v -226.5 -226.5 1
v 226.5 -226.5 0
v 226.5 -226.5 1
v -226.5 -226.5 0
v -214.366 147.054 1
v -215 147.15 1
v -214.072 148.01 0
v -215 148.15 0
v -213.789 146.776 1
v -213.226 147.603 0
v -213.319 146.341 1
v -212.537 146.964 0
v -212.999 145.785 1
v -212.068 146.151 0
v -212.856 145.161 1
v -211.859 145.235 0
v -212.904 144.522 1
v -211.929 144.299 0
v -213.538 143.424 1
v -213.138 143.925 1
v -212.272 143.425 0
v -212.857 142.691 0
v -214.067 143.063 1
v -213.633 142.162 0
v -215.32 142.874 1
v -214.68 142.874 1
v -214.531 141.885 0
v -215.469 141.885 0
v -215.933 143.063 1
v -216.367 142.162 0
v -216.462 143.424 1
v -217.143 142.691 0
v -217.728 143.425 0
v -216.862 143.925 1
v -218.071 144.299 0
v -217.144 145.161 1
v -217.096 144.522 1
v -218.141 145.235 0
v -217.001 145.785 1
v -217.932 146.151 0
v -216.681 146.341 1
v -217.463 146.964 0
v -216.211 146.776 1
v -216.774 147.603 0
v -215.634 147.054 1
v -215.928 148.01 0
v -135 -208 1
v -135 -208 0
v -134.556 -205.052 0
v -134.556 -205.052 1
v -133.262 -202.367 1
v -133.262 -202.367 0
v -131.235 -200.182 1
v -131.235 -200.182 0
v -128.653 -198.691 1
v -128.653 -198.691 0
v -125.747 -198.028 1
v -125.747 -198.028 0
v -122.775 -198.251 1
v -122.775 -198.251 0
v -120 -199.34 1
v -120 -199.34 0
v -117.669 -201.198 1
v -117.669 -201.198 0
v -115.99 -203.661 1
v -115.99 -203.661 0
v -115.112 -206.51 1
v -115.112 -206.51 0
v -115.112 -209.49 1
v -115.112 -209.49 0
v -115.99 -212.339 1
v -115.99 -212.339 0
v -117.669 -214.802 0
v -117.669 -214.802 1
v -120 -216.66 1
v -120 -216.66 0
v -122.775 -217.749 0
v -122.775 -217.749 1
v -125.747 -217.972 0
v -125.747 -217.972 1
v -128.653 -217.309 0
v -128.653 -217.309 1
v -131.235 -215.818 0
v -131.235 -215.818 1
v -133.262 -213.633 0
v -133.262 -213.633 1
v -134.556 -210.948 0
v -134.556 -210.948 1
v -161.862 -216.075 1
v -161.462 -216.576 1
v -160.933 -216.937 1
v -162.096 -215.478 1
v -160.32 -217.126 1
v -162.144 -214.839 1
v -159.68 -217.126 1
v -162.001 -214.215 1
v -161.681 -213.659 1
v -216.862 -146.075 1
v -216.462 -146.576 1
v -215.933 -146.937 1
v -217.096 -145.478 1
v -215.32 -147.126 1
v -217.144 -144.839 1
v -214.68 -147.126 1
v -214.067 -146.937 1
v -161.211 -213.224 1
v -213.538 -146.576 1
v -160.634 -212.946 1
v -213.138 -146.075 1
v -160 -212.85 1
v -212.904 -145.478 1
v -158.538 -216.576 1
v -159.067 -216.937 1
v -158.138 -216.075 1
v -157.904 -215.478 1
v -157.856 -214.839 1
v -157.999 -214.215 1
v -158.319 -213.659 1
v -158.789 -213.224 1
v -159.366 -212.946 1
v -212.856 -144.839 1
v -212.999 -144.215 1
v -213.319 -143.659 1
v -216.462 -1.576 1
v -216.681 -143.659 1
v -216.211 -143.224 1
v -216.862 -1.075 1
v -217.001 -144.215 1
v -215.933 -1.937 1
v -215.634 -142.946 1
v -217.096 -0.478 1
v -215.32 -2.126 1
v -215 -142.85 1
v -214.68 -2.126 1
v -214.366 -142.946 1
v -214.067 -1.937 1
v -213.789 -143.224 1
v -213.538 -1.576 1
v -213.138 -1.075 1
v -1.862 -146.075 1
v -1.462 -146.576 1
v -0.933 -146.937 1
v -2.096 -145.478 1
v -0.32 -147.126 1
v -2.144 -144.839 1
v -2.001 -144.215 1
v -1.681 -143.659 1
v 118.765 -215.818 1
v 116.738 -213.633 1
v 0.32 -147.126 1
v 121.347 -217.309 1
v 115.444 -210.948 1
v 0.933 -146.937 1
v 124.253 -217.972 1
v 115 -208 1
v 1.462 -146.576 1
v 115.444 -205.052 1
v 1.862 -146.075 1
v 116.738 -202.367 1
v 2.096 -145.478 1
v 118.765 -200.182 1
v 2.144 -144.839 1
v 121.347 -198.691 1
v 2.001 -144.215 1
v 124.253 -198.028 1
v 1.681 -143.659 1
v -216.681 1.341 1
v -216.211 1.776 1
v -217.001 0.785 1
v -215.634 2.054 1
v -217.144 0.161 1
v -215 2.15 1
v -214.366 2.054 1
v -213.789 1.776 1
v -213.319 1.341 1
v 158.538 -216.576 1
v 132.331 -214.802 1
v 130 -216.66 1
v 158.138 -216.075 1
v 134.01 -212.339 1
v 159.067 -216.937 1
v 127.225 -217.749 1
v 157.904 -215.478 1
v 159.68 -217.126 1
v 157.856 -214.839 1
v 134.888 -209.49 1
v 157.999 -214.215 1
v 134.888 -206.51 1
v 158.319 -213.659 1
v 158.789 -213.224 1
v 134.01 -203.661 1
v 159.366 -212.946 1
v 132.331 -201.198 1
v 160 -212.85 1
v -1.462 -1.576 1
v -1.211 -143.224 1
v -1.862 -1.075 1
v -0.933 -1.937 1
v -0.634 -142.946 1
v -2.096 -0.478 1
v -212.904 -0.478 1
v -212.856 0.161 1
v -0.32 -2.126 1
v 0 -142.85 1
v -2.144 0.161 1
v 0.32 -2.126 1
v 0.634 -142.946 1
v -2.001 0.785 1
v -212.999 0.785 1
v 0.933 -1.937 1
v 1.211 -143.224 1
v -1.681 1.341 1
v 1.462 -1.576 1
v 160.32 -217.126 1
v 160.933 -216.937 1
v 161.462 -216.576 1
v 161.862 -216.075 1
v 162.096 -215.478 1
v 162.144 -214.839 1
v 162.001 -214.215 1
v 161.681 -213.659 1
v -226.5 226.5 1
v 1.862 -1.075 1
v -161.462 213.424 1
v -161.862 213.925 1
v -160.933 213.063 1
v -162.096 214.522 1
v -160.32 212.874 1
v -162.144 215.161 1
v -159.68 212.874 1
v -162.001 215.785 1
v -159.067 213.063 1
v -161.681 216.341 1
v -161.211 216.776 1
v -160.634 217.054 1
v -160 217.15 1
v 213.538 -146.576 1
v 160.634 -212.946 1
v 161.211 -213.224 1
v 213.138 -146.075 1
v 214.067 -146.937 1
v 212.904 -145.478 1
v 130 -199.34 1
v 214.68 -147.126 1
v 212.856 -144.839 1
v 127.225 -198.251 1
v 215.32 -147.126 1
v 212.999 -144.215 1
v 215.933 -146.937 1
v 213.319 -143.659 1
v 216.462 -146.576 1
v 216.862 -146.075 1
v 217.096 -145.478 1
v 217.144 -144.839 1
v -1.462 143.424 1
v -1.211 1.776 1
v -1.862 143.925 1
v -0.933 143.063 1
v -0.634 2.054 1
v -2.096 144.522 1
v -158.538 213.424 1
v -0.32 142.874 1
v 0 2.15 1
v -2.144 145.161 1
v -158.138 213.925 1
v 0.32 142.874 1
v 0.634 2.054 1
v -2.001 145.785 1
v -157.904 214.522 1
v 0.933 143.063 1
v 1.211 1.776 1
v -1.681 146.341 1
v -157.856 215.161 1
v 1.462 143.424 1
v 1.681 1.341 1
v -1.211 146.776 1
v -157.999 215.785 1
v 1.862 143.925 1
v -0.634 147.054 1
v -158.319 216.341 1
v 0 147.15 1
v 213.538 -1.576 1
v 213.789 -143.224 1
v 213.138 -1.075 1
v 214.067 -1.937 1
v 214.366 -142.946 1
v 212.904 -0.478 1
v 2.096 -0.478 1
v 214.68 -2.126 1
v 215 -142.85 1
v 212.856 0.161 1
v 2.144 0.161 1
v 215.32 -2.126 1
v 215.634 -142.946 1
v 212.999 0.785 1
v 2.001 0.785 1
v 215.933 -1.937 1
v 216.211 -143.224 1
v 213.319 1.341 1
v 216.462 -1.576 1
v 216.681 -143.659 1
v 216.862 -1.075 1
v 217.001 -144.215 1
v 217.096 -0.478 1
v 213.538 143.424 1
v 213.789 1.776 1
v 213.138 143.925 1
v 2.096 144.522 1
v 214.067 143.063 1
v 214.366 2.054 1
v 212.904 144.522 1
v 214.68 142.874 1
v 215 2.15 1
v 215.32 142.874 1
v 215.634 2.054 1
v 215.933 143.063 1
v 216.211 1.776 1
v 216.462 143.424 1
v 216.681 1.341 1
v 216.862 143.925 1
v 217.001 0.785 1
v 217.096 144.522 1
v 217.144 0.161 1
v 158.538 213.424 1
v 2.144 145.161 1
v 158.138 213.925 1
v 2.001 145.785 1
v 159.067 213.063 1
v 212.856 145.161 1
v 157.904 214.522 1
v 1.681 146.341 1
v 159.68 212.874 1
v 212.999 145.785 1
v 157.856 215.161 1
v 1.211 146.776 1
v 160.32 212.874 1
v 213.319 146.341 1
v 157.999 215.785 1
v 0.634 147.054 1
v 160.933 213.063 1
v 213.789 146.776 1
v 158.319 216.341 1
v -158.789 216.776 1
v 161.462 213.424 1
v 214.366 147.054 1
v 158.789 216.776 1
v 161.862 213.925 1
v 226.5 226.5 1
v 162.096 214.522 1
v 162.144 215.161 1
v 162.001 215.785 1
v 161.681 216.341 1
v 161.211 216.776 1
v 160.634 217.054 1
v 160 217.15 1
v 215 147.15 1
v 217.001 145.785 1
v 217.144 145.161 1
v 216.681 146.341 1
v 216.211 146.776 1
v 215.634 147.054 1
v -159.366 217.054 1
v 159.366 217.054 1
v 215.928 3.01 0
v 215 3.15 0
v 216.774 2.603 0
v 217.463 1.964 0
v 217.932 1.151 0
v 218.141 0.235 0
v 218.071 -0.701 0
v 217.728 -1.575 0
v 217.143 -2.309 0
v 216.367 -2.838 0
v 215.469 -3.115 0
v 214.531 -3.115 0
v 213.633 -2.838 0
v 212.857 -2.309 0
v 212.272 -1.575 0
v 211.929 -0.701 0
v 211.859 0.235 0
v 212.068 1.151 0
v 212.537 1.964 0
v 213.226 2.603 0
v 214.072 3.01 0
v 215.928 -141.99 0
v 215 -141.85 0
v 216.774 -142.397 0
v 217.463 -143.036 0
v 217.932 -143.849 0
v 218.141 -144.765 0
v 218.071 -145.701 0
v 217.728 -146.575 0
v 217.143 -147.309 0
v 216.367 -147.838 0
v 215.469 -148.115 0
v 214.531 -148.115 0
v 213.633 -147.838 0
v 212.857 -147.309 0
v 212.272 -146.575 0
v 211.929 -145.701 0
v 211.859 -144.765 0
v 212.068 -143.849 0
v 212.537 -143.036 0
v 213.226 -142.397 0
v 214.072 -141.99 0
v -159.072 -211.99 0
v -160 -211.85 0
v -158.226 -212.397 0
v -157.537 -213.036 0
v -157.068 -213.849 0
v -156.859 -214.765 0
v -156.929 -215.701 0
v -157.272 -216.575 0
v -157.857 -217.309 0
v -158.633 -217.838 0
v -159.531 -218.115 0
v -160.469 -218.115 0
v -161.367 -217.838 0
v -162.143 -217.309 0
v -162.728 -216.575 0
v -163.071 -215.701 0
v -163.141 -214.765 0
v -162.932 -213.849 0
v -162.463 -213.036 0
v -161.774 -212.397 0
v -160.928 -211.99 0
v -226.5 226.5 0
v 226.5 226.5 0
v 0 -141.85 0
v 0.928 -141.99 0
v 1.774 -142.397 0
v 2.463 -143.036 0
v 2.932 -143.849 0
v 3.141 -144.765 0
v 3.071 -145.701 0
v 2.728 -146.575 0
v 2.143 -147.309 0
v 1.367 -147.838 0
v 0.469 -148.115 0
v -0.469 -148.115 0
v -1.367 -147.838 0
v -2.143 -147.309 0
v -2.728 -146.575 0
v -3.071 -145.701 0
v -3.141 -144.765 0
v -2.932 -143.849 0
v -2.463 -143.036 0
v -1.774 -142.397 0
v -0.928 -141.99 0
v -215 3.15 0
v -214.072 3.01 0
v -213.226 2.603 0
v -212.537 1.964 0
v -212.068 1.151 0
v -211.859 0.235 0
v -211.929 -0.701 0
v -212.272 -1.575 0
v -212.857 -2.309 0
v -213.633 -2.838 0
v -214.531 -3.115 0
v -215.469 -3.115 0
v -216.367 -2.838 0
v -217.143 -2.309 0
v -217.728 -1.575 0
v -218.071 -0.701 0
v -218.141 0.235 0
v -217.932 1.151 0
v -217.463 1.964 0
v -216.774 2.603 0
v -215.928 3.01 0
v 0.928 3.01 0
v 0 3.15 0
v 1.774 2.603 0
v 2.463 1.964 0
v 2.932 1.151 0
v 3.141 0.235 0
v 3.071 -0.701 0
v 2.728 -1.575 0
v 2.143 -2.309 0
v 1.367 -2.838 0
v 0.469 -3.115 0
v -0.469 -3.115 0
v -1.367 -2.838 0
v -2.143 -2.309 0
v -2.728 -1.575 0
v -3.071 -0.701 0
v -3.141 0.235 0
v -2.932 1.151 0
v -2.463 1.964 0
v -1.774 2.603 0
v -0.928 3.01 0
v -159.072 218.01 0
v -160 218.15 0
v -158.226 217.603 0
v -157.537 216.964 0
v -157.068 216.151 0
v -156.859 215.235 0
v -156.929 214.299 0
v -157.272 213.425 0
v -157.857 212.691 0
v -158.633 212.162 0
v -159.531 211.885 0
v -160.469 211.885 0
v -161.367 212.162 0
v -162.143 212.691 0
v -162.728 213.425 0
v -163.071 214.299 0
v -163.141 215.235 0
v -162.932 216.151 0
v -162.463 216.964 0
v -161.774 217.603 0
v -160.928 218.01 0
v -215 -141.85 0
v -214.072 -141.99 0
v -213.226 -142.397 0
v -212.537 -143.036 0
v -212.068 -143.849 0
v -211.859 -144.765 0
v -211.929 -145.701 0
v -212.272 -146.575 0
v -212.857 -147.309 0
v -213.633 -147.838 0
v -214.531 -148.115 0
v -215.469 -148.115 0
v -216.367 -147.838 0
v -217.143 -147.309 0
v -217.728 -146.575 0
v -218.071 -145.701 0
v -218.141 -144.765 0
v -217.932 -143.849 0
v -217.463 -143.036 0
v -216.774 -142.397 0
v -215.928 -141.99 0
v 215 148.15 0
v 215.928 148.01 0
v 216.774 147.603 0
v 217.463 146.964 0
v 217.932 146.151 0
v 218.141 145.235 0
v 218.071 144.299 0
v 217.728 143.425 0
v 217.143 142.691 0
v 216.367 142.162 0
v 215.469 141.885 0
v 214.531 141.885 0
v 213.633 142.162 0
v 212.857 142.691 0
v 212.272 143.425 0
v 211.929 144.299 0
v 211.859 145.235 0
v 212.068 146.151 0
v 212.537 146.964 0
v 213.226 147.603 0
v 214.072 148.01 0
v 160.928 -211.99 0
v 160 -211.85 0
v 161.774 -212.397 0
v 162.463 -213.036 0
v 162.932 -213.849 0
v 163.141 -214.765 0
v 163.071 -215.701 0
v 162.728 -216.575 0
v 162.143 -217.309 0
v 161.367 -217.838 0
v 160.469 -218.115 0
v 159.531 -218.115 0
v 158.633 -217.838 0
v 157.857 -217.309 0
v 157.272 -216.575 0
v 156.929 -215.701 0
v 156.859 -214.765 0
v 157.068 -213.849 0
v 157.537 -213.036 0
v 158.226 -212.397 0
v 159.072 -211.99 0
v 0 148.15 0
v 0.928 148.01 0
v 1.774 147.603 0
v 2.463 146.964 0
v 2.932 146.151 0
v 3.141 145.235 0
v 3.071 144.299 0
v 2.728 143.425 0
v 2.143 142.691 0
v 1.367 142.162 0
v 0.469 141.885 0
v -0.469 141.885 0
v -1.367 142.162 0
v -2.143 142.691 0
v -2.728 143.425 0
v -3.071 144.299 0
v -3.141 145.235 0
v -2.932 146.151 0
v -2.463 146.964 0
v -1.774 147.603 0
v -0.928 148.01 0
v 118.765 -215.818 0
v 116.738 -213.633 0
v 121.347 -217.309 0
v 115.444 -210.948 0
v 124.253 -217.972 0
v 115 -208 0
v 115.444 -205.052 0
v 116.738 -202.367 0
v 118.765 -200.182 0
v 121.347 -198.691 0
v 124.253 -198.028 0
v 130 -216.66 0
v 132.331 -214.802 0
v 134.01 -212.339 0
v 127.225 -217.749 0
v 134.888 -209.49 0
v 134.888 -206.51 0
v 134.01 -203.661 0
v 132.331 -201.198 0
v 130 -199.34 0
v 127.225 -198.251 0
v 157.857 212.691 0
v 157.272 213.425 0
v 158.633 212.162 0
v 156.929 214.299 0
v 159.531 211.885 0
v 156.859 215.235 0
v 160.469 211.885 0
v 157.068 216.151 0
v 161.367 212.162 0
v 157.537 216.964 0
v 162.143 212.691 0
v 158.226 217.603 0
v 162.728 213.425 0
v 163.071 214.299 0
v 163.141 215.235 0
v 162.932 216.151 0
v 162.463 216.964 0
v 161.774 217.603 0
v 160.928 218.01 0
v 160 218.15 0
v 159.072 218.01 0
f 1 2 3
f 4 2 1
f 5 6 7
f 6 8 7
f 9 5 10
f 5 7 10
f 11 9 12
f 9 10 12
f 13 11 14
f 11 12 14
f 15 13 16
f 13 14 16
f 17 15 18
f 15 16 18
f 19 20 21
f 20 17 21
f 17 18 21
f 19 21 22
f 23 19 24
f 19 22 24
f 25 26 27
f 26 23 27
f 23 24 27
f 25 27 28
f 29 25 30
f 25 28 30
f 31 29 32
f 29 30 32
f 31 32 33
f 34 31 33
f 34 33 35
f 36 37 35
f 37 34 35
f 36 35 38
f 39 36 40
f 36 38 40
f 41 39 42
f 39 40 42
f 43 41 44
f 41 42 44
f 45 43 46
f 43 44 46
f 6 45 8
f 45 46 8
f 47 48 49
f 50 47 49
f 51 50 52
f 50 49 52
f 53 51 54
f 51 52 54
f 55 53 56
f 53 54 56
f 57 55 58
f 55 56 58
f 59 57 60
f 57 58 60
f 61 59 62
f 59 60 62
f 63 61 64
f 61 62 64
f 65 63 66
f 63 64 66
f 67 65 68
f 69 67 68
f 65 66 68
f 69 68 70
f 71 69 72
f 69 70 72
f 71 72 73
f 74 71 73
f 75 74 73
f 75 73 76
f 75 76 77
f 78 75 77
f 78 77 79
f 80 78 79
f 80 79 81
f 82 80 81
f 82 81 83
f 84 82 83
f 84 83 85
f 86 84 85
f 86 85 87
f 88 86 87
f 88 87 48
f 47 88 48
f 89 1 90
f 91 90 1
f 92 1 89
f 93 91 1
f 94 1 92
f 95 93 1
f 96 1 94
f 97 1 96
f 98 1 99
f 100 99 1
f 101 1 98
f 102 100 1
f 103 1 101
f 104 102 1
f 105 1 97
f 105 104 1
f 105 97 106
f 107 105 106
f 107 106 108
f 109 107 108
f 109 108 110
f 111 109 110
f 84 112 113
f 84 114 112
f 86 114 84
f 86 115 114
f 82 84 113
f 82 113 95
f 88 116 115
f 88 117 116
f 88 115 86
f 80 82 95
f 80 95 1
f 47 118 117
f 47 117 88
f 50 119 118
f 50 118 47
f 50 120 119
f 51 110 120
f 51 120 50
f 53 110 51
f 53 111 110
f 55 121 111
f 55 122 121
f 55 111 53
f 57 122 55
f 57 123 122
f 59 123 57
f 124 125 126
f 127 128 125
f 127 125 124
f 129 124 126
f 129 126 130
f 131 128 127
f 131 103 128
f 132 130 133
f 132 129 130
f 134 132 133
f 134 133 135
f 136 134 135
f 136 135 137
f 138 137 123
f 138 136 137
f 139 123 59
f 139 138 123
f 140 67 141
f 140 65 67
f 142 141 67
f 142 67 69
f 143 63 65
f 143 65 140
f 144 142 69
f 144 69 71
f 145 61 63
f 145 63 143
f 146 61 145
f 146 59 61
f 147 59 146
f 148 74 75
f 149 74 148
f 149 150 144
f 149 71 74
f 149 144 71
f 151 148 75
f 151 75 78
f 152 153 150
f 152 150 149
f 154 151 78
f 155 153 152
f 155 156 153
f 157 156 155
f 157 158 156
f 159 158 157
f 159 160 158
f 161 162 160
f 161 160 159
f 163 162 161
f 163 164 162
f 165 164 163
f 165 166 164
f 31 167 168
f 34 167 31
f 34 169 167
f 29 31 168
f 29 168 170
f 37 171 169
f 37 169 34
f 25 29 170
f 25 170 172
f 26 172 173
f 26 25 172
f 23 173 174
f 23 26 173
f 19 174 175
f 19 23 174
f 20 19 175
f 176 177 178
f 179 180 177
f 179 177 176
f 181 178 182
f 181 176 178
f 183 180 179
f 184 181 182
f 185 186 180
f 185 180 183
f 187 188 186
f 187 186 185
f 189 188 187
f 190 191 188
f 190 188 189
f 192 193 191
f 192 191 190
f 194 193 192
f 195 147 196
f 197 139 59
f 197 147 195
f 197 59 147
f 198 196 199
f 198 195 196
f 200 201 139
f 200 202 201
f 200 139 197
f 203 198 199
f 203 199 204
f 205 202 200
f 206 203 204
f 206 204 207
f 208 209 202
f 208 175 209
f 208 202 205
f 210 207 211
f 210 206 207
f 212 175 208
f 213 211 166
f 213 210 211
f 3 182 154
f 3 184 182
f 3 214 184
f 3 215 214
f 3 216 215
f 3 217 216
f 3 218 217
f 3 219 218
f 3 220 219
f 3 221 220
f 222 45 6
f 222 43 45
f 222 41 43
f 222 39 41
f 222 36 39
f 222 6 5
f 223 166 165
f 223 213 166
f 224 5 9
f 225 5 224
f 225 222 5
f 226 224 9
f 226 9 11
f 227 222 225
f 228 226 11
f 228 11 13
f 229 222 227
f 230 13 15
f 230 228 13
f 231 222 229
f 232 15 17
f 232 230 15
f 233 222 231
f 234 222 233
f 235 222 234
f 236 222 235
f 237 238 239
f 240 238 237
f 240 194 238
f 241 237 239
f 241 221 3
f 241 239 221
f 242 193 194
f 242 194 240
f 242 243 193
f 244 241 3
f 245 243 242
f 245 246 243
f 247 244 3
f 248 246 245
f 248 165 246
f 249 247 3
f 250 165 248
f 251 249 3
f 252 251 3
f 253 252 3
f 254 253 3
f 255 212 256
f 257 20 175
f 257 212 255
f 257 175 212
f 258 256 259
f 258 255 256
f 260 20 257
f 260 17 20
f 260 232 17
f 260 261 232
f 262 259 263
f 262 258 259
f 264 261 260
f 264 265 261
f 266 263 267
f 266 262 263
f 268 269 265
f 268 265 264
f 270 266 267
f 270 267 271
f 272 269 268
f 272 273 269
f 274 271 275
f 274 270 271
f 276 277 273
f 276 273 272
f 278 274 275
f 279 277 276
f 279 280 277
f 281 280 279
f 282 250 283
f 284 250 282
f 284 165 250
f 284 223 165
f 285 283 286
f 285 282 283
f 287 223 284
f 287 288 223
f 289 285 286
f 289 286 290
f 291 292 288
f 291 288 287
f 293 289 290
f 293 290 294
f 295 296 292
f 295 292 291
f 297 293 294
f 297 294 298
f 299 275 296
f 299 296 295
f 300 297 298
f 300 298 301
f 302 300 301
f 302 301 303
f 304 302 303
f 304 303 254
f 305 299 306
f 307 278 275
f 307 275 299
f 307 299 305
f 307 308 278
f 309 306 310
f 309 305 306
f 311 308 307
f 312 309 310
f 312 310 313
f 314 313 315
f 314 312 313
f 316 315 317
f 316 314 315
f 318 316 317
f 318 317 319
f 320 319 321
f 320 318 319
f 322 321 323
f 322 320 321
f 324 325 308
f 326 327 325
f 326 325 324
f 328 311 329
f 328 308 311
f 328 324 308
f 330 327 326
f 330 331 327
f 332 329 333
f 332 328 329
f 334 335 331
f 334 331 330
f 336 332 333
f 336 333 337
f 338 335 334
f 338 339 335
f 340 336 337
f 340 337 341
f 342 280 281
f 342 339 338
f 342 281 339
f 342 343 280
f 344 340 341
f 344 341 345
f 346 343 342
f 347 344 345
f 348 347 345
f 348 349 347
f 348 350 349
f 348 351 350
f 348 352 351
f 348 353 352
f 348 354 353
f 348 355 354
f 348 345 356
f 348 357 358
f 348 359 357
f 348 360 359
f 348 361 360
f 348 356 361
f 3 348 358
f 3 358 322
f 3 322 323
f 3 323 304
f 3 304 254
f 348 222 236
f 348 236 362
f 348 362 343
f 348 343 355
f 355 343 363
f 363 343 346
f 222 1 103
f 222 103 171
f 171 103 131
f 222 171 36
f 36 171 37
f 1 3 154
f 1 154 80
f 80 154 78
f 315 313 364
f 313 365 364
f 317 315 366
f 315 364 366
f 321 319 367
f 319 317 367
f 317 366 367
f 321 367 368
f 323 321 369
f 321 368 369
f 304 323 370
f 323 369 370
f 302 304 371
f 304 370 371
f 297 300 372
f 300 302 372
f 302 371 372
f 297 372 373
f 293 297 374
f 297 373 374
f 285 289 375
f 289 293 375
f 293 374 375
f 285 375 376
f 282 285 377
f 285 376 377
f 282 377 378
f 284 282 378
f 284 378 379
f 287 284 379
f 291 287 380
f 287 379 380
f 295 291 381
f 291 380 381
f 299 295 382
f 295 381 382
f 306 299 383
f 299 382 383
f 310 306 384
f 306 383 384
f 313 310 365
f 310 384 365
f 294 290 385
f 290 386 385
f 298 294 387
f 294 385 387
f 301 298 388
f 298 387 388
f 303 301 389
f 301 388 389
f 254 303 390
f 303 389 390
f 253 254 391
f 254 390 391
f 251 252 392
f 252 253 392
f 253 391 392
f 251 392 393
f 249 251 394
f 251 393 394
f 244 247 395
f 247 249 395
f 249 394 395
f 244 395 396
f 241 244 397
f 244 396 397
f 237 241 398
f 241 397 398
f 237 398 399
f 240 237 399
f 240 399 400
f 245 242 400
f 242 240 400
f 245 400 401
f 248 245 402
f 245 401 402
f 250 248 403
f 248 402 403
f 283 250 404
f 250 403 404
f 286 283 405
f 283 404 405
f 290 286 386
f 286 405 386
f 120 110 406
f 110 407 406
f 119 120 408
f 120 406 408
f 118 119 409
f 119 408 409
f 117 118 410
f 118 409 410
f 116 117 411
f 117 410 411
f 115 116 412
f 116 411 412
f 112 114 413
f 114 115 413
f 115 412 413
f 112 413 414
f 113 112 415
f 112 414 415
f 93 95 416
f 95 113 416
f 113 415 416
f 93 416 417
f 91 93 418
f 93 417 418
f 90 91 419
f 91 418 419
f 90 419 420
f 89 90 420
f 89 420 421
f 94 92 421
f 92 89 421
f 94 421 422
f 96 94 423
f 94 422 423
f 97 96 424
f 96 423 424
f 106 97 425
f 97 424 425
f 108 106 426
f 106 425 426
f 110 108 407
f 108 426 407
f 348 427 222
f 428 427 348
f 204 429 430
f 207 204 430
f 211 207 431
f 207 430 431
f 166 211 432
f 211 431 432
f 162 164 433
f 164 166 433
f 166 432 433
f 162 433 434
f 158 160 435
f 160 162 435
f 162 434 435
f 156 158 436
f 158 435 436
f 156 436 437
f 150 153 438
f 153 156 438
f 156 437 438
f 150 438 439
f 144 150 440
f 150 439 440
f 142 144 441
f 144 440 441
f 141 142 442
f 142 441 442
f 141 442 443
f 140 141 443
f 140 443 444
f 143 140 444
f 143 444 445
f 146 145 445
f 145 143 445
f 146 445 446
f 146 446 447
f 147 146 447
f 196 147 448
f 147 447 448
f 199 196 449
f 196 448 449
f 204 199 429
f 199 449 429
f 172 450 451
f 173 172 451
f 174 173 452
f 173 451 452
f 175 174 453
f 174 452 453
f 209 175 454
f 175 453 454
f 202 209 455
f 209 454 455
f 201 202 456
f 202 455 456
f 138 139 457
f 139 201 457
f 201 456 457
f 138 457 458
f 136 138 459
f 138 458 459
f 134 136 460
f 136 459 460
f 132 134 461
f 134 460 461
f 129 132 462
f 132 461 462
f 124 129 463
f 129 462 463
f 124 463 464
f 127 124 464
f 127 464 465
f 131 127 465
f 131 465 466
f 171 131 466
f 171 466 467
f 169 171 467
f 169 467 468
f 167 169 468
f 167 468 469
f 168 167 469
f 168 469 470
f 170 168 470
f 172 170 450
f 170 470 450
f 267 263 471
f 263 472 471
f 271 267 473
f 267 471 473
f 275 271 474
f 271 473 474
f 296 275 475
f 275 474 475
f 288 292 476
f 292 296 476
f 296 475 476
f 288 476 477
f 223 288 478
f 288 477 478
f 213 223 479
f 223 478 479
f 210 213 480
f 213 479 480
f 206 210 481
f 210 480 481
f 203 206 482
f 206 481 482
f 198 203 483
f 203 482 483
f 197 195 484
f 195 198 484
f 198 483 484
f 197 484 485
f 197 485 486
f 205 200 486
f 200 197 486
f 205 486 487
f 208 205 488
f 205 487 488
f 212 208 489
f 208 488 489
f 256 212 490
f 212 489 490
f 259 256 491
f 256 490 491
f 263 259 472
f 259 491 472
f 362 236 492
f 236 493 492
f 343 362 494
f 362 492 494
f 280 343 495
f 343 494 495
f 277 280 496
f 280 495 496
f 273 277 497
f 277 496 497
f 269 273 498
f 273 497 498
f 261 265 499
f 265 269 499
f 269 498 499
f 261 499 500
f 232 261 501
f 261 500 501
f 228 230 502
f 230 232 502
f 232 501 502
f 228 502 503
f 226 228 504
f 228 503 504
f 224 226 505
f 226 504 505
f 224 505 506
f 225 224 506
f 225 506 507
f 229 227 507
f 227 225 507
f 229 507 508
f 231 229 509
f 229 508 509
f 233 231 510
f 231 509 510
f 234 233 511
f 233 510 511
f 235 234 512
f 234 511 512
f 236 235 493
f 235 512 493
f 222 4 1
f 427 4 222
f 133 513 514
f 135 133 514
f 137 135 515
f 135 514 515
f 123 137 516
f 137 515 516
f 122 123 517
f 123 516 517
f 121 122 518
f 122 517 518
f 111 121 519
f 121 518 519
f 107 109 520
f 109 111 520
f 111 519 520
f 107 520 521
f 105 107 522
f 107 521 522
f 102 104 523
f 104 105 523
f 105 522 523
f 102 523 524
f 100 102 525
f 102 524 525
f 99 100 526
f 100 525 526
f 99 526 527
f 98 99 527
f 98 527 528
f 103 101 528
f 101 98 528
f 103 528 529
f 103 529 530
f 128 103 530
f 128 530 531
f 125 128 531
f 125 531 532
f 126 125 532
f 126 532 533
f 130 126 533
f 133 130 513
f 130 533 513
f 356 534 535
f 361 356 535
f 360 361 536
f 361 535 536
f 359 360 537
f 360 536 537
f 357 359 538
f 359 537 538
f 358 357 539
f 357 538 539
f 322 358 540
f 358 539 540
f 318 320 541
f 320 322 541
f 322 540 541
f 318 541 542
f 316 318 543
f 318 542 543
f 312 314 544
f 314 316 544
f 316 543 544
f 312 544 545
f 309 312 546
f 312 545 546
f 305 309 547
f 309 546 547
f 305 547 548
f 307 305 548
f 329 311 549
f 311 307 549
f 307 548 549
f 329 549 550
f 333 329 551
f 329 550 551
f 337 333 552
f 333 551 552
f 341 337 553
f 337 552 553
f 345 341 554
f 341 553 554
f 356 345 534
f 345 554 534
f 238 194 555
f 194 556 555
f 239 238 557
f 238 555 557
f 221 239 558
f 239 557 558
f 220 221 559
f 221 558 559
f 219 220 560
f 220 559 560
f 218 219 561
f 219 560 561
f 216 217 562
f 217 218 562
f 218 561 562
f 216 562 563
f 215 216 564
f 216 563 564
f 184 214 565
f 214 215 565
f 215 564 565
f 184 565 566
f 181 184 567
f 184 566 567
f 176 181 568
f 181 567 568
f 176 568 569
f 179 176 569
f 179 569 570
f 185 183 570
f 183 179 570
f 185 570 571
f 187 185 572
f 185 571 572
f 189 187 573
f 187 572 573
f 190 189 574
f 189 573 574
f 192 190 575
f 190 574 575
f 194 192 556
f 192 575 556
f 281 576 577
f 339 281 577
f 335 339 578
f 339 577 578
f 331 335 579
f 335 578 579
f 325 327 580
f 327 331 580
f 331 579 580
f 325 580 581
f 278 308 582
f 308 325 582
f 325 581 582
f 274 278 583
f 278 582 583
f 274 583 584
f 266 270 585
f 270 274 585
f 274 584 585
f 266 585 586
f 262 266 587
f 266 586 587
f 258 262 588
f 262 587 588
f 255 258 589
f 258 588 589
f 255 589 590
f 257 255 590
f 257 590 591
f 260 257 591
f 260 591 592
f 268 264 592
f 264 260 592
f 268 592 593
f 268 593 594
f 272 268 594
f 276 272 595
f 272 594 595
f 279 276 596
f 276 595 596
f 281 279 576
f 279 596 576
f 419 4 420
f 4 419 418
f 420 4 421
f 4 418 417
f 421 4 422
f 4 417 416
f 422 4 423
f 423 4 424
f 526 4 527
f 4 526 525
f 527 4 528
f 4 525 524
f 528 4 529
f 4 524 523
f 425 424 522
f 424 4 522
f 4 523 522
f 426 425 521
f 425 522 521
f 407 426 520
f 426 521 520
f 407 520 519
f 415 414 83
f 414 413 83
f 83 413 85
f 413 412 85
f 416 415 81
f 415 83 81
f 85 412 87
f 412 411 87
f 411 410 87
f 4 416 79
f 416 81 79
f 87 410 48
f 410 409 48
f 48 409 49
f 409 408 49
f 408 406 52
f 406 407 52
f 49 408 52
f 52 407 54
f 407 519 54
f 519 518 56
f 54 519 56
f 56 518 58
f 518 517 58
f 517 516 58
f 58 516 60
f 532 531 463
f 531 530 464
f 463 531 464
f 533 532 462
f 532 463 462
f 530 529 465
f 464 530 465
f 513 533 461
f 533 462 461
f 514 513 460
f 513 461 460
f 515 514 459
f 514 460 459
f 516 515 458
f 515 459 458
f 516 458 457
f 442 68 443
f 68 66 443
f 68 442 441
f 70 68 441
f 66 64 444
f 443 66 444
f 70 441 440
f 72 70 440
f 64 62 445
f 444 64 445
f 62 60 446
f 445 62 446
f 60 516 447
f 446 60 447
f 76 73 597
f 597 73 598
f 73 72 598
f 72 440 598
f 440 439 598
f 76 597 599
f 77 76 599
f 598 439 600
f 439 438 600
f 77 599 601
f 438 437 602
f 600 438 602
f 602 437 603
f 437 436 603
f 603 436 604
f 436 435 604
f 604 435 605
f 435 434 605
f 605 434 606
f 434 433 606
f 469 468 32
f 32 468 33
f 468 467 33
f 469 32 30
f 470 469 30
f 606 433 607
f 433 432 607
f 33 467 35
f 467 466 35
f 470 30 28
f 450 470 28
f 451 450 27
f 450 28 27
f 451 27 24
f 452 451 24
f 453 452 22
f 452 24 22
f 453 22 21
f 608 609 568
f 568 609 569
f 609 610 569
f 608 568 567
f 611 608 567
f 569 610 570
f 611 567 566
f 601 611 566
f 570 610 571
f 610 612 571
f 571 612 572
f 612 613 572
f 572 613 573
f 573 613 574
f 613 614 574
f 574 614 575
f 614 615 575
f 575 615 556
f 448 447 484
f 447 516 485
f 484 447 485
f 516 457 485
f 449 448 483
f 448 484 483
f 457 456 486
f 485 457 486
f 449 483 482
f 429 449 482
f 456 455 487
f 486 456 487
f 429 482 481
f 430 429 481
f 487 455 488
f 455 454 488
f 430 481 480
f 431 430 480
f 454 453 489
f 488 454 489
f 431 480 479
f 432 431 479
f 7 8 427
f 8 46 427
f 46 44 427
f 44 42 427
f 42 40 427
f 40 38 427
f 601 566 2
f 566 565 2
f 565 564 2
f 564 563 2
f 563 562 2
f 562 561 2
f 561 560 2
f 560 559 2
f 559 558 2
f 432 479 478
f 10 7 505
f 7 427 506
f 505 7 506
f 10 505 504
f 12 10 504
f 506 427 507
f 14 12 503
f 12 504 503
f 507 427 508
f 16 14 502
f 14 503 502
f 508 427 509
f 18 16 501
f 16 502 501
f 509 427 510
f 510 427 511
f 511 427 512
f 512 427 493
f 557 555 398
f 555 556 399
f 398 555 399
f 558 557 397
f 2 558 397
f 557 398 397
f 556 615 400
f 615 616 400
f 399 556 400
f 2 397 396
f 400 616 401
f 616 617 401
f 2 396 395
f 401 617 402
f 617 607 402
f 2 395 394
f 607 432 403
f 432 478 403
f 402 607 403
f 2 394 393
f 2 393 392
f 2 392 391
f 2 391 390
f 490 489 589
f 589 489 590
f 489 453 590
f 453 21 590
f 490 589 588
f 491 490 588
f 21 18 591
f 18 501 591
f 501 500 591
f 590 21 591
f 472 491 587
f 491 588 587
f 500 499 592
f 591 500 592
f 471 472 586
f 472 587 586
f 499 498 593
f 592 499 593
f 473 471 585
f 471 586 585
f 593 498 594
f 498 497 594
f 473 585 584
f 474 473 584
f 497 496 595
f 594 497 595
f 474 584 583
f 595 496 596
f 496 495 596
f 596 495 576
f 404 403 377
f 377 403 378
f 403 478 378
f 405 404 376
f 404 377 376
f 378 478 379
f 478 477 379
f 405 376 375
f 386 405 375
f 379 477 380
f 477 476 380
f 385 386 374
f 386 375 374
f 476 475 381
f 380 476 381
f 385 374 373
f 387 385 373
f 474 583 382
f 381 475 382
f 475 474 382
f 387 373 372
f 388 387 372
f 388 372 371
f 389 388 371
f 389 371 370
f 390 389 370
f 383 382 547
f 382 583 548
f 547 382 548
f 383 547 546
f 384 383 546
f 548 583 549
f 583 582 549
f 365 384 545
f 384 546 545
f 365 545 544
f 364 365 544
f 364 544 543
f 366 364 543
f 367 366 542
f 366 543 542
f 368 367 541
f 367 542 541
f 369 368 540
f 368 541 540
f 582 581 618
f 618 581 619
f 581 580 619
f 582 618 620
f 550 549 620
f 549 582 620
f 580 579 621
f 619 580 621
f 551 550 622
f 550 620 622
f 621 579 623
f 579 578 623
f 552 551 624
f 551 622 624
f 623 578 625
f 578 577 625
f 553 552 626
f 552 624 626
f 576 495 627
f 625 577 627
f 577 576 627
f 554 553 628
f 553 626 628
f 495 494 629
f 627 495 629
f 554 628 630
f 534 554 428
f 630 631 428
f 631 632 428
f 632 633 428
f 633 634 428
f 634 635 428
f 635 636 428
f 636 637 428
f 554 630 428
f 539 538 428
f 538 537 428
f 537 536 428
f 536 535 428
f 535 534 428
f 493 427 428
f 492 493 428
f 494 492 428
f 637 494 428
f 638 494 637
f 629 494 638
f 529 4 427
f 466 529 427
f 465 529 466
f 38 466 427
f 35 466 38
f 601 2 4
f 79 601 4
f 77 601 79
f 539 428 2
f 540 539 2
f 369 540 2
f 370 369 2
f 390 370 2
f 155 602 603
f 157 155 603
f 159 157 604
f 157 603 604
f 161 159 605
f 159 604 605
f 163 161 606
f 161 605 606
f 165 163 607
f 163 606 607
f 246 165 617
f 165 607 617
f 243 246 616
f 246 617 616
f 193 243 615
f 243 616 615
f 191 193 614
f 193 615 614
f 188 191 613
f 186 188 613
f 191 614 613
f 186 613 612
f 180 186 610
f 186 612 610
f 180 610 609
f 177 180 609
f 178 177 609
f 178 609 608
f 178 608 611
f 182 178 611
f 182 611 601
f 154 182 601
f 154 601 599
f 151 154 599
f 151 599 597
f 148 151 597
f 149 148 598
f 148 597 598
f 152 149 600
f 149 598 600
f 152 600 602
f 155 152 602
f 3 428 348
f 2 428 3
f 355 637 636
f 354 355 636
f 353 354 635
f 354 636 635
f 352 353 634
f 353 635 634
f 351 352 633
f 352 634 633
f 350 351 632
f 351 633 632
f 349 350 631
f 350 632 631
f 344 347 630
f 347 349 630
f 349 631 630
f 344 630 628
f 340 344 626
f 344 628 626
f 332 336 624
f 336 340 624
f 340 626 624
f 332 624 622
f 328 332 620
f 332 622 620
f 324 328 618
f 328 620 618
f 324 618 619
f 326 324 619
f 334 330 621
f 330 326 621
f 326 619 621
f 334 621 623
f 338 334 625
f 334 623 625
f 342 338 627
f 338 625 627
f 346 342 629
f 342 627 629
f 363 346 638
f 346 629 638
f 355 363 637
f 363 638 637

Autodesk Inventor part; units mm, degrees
ref_plane "YZ Plane" through (0, 0, 0) normal (1, 0, 0) x (0, 1, 0)
ref_plane "XZ Plane" through (0, 0, 0) normal (0, 1, 0) x (-1, 0, 0)
ref_plane "XY Plane" through (0, 0, 0) normal (0, 0, 1) x (1, 0, 0)
sketch "Skizze2" plane through (0, 0, 0) normal (0, 0, 1) x (1, 0, 0)
  line L0 (-226.5, 226.5) -> (226.5, 226.5)
  line L1 (226.5, 226.5) -> (226.5, -226.5)
  line L2 (226.5, -226.5) -> (-226.5, -226.5)
  line L3 (-226.5, -226.5) -> (-226.5, 226.5)
  point P0 (0, 0)
  point P1 (0, 226.5)
  point P2 (-226.5, 0)
  dimension "d0" = 453
extrude "Extrusion1" add sketch "Skizze2" along normal blind 1
sketch "Skizze3" plane through (0, 0, 0) normal (0, 0, -1) x (-1, 0, 0)
  circle A0 centre (125, -208) radius 10
  line L0 (0, -317.1) -> (0, 317.1) projected
  line L1 (226.5, -226.5) -> (-226.5, -226.5) projected
  point P0 (0, 0)
  dimension "d3" = 20
  dimension "d4" = 125
  dimension "d5" = 18.5
extrude "Extrusion2" cut sketch "Skizze3" against normal blind 1
pattern_linear "Rechteckige Anordnung1" count 2 spacing 250 along (1, 0, 0) of "Extrusion2"
sketch "Skizze4" plane through (0, 0, 0) normal (0, 0, -1) x (-1, 0, 0)
  point P0 (0, 0)
  point P1 (160, -215)
  point P2 (-160, -215)
  point P3 (-160, 215)
  point P4 (160, 215)
  point P5 (0, 0)
  point P6 (-215, -145)
  point P7 (-215, 0)
  point P8 (-215, 145)
  point P9 (215, 145)
  point P10 (215, 0)
  point P11 (215, -145)
  point P12 (0, 0)
  point P13 (0, -145)
  point P14 (0, 145)
  dimension "d11" = 160
  dimension "d12" = 160
  dimension "d13" = 215
  dimension "d14" = 215
  dimension "d22" = 215
  dimension "d23" = 145
  dimension "d24" = 145
  dimension "d25" = 215
  dimension "d26" = 145
  dimension "d27" = 145
hole "Bohrung1" at (0, 0, 0) direction (0, 0, 1) diameter 3.4 depth 15 tip angle 118 countersink diameter 6.3 countersink angle 90 clearance for "Flachkopfsenkschraube" size "M3" standard "Schneeberger VSM"
pattern_sketch "Skizzenbasierte Anordnung1" of "Bohrung1" from (0, 0, 0) copies at (-160, -215, 0) at (160, -215, 0) at (160, 215, 0) at (-160, 215, 0) at (215, -145, 0) at (215, 0, 0) at (215, 145, 0) at (-215, 145, 0) at (-215, 0, 0) at (-215, -145, 0) at (0, -145, 0) at (0, 145, 0)
equation "\"d10\" = 2 * d4"
equation "\"d14\" = d13"
equation "\"d23\" = d24"
equation "\"d25\" = d22"
equation "\"d27\" = d26"
properties part number "Rückplatte" material "PA 6.6"
